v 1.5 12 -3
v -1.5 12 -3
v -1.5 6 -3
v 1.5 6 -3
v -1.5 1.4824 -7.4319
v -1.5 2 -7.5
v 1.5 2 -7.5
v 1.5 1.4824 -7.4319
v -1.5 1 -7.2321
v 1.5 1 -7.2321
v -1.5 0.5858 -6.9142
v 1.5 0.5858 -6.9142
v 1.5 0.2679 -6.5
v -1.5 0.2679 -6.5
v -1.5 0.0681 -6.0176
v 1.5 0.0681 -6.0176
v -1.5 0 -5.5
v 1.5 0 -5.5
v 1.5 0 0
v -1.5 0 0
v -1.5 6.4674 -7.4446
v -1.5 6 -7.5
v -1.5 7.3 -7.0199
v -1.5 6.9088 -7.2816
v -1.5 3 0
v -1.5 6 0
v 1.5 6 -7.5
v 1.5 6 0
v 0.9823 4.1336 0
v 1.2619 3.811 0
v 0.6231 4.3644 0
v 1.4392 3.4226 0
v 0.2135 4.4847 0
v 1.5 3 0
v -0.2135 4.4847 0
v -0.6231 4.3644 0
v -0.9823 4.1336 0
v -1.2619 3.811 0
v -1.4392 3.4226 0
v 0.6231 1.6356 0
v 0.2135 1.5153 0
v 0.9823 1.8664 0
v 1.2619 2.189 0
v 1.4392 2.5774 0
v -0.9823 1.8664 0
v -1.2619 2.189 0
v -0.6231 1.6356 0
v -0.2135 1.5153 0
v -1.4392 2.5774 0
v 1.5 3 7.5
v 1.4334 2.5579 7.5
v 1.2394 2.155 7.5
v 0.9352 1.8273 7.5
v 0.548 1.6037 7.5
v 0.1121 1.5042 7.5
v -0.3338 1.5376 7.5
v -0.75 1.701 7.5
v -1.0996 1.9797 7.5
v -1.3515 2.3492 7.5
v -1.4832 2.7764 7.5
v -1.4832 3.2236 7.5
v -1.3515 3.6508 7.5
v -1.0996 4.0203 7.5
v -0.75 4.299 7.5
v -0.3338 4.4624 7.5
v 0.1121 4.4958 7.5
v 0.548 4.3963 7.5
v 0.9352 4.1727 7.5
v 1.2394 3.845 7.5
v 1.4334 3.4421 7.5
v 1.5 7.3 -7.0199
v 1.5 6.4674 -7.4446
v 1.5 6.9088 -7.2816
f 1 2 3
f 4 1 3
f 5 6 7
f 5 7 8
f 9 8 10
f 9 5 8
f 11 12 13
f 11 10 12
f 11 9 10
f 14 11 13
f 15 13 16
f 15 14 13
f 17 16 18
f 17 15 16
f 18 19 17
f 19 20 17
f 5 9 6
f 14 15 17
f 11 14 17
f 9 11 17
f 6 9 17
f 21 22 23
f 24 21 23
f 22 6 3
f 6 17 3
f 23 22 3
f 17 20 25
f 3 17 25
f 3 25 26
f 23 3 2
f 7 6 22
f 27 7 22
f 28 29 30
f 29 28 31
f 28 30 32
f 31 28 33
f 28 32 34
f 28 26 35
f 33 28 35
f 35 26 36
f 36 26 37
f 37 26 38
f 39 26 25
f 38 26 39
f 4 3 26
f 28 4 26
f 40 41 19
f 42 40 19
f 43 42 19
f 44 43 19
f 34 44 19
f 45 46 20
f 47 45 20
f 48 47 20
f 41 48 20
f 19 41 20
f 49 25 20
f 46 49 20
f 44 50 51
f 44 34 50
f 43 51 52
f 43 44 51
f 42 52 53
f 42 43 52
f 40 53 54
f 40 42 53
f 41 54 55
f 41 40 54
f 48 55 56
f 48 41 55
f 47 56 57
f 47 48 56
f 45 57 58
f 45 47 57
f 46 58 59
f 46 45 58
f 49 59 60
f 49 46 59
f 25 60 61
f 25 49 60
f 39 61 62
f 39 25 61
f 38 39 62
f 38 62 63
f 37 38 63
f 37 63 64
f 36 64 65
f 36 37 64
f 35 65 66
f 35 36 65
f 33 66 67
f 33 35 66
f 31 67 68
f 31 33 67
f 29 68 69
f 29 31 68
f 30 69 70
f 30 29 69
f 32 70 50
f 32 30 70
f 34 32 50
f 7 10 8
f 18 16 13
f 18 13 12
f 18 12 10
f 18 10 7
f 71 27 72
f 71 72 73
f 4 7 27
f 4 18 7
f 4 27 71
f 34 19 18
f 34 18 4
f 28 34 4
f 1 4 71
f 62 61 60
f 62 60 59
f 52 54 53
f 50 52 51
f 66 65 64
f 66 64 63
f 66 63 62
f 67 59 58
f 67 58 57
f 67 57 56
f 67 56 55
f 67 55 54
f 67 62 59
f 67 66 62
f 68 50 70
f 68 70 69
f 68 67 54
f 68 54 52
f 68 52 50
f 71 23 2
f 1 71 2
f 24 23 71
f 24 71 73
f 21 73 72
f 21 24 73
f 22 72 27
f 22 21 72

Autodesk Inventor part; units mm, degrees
ref_plane "YZ Plane" through (0, 0, 0) normal (1, 0, 0) x (0, 1, 0)
ref_plane "XZ Plane" through (0, 0, 0) normal (0, 1, 0) x (-1, 0, 0)
ref_plane "XY Plane" through (0, 0, 0) normal (0, 0, 1) x (1, 0, 0)
sketch "Skizze1" plane through (0, 0, 0) normal (1, 0, 0) x (0, 1, 0)
  line L0 (0, 0) -> (0, -5.5)
  line L1 (2, -7.5) -> (6, -7.5)
  line L2 (7.3, -7.0199) -> (12, -3)
  line L3 (12, -3) -> (6, -3)
  line L4 (6, -3) -> (6, 0)
  line L5 (6, 0) -> (1.5, 0)
  line L6 (1.5, 0) -> (0, 0)
  arc A0 (0, -5.5) -> (2, -7.5) centre (2, -5.5) ccw
  arc A1 (6, -7.5) -> (7.3, -7.0199) centre (6, -5.5) ccw
  dimension "d3" = 3
  dimension "d4" = 6
  dimension "d8" = 2
  dimension "d9" = 6
  dimension "d10" = 7.5
extrude "Extrusion1" add sketch "Skizze1" along normal mid plane 3
sketch "Skizze2" plane through (-1.5, 0, 0) normal (0, 0, 1) x (1, 0, 0)
  circle A0 centre (1.5, 3) radius 1.5
  line L0 (0, 0) -> (3, 0) projected
  point P0 (1.5, 0)
  point P1 (1.5, 0)
  point P2 (1.5, 0)
  dimension "d13" = 3
  dimension "d14" = 3
extrude "Extrusion2" add sketch "Skizze2" along normal blind 7.5
thread "Gewinde1" size "M3x0.5" class "6g" standard "ISO Metric profile" length 11
properties part number "1 part 8"
